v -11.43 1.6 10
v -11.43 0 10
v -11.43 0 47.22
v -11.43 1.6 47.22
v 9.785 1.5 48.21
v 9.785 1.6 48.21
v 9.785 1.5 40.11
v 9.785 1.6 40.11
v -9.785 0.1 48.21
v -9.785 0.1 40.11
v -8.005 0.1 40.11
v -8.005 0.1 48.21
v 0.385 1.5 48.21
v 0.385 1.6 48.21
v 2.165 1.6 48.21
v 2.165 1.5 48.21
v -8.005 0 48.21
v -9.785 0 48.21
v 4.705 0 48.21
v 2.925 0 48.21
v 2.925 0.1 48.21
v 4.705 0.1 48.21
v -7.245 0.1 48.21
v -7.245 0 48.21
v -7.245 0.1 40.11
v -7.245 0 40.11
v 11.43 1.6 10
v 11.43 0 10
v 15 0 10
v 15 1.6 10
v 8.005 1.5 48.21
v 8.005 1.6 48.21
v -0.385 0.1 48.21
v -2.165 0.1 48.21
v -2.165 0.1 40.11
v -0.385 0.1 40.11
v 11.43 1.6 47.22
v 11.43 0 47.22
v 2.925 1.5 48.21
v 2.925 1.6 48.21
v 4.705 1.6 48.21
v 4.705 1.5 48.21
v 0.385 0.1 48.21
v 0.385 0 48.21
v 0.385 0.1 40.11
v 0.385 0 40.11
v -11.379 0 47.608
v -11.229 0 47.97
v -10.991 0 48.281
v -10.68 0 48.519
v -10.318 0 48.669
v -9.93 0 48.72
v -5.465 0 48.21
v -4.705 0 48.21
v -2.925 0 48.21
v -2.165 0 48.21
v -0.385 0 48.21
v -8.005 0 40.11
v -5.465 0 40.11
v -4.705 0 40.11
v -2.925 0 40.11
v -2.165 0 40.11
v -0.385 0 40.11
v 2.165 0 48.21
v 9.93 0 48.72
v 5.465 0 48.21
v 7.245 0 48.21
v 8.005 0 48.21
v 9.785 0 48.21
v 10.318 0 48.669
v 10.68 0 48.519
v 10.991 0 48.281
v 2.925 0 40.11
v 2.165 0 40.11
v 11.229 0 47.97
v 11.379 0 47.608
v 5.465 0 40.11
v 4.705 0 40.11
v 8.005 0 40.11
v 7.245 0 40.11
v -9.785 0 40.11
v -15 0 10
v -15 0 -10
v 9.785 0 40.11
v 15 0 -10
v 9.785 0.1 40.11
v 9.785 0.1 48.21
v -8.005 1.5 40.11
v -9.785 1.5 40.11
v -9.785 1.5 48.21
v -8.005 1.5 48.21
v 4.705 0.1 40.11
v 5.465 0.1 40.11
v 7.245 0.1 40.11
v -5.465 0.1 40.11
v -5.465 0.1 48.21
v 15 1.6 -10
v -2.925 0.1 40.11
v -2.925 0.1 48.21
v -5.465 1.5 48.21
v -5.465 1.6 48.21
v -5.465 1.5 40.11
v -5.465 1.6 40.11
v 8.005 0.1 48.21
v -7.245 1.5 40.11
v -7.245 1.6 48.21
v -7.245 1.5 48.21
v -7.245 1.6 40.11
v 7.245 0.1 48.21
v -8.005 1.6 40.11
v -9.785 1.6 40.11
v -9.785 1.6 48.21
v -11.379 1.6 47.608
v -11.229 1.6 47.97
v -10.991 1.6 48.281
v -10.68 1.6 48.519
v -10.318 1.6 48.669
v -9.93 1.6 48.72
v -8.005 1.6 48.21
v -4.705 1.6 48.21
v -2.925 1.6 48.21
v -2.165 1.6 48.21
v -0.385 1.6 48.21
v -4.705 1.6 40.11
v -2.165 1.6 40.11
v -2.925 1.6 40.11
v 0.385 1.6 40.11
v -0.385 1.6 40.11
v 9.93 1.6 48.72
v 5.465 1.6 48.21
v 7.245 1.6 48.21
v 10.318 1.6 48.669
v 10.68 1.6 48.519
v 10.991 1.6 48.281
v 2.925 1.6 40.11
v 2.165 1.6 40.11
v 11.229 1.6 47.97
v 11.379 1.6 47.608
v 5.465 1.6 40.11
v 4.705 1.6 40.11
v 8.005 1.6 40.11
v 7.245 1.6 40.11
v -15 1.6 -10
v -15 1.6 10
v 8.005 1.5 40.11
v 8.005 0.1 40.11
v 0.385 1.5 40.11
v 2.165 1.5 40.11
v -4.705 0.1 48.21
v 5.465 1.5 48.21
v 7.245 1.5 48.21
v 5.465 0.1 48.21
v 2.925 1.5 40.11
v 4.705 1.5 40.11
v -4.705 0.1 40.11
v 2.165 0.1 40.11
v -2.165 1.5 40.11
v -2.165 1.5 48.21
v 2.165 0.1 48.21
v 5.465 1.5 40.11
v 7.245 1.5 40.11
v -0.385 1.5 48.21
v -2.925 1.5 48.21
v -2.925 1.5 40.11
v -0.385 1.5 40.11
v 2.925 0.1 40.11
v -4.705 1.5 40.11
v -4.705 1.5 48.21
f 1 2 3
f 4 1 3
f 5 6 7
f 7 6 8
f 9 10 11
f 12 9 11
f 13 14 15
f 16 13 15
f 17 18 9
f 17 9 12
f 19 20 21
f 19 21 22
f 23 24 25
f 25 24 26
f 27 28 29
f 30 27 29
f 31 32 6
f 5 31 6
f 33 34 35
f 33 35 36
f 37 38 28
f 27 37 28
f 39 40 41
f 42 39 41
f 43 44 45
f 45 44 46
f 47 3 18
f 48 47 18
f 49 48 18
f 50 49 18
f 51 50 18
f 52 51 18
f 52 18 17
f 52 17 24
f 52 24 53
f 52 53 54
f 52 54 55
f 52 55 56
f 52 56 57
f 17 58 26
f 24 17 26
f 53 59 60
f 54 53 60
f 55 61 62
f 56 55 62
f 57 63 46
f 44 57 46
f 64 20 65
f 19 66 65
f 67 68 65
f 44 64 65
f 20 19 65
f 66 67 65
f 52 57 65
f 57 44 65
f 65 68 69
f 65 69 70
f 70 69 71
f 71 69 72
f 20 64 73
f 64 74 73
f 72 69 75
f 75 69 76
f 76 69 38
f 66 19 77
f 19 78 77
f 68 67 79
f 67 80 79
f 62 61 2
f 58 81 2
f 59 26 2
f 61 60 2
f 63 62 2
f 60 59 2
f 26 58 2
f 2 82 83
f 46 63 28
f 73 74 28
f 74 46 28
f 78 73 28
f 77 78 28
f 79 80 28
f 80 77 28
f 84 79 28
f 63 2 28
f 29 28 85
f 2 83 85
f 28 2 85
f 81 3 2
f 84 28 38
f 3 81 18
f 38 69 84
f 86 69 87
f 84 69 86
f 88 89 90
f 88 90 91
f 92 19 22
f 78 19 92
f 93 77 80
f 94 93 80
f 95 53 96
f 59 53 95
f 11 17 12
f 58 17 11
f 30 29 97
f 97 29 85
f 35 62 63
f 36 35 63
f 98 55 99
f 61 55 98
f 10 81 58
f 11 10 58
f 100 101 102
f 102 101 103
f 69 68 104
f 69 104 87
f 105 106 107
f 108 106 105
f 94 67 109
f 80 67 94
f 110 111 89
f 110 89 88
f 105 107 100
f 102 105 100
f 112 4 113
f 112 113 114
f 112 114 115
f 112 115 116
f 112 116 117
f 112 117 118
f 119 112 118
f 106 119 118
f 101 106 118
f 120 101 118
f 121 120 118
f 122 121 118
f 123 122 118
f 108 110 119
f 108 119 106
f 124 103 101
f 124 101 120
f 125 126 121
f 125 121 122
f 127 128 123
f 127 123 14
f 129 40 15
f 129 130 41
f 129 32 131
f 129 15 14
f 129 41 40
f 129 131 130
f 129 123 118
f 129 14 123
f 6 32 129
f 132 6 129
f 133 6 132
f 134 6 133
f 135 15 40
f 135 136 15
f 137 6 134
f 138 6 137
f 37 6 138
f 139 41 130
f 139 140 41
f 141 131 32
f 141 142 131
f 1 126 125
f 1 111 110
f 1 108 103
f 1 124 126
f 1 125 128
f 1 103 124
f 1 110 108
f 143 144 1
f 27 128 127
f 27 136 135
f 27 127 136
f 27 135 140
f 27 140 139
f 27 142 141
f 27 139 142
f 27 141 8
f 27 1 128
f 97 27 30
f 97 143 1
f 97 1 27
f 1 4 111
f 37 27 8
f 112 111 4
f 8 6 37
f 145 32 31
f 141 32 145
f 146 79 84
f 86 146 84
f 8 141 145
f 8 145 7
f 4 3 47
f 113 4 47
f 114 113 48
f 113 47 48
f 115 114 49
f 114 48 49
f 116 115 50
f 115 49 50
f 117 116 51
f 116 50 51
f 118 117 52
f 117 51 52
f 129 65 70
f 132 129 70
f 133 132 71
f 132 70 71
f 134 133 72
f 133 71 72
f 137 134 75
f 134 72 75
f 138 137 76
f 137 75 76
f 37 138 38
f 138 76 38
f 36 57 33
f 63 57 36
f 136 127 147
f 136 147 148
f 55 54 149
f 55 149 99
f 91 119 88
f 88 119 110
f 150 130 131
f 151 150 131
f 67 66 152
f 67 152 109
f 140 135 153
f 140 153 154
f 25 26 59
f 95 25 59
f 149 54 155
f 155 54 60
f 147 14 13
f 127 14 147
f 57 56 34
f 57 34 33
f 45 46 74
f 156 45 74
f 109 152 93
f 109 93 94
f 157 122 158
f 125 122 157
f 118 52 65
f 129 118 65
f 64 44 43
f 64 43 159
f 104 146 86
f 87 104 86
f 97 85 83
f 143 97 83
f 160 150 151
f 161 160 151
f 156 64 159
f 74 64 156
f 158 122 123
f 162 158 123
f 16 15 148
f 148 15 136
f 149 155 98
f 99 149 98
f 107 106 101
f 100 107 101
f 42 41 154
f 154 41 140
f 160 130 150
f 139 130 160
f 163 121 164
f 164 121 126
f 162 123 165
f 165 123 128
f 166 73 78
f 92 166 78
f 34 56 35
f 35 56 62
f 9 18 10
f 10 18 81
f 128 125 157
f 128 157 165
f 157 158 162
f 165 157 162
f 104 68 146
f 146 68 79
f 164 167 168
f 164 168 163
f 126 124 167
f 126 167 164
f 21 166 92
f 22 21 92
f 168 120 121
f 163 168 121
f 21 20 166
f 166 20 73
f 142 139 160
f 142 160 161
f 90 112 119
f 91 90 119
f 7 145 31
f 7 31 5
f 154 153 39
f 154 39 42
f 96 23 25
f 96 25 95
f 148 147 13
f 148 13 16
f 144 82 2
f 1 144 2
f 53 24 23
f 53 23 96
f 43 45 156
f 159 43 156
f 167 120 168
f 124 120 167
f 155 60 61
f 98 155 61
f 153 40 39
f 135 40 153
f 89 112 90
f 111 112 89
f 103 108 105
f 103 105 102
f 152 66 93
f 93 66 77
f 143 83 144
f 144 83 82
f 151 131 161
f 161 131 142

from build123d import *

# Parameters (mm, degrees)
EXTRUDE_1_DEPTH     = 1.6
CUT_EXTRUDE_START   = 1.6
SKETCH_3_W          = 1.78
SKETCH_3_H          = 8.1
CUT_EXTRUDE_1_DEPTH = 0.1
SKETCH_4_W          = 1.78
SKETCH_4_H          = 8.1
CUT_EXTRUDE_2_DEPTH = 0.1


with BuildPart() as part:
    # 草图1 → 凸台-拉伸1 (new body)
    with BuildSketch(Plane(origin=(0, 0, 0), x_dir=(1, 0, 0), z_dir=(0, 1, 0))):
        with BuildLine():
            Line((11.43, -10), (15, -10))
            Line((15, -10), (15, 10))
            Line((15, 10), (-15, 10))
            Line((-15, 10), (-15, -10))
            Line((-15, -10), (-11.43, -10))
            Line((-11.43, -10), (-11.43, -47.22))
            ThreePointArc((-11.43, -47.22), (-10.990660172, -48.280660172), (-9.93, -48.72))
            Line((-9.93, -48.72), (9.93, -48.72))
            ThreePointArc((9.93, -48.72), (10.990660172, -48.280660172), (11.43, -47.22))
            Line((11.43, -47.22), (11.43, -10))
        make_face()
    extrude(amount=EXTRUDE_1_DEPTH)

    # 草图3 → 切除-拉伸1 (cut)
    with BuildSketch(Plane(origin=(0, 0, 0), x_dir=(1, 0, 0), z_dir=(0, 1, 0)).offset(CUT_EXTRUDE_START)):
        with Locations((-1.275, -44.16)):
            Rectangle(SKETCH_3_W, SKETCH_3_H)
        with Locations((1.275, -44.16)):
            Rectangle(SKETCH_3_W, SKETCH_3_H)
        with Locations((-3.815, -44.16)):
            Rectangle(SKETCH_3_W, SKETCH_3_H)
        with Locations((-6.355, -44.16)):
            Rectangle(SKETCH_3_W, SKETCH_3_H)
        with Locations((-8.895, -44.16)):
            Rectangle(SKETCH_3_W, SKETCH_3_H)
        with Locations((3.815, -44.16)):
            Rectangle(SKETCH_3_W, SKETCH_3_H)
        with Locations((6.355, -44.16)):
            Rectangle(SKETCH_3_W, SKETCH_3_H)
        with Locations((8.895, -44.16)):
            Rectangle(SKETCH_3_W, SKETCH_3_H)
    extrude(amount=-CUT_EXTRUDE_1_DEPTH, mode=Mode.SUBTRACT)

    # 草图4 → 切除-拉伸2 (cut)
    with BuildSketch(Plane(origin=(0, 0, 0), x_dir=(1, 0, 0), z_dir=(0, 1, 0))):
        with Locations((1.275, -44.16)):
            Rectangle(SKETCH_4_W, SKETCH_4_H)
        with Locations((-1.275, -44.16)):
            Rectangle(SKETCH_4_W, SKETCH_4_H)
        with Locations((-8.895, -44.16)):
            Rectangle(SKETCH_4_W, SKETCH_4_H)
        with Locations((-6.355, -44.16)):
            Rectangle(SKETCH_4_W, SKETCH_4_H)
        with Locations((-3.815, -44.16)):
            Rectangle(SKETCH_4_W, SKETCH_4_H)
        with Locations((8.895, -44.16)):
            Rectangle(SKETCH_4_W, SKETCH_4_H)
        with Locations((6.355, -44.16)):
            Rectangle(SKETCH_4_W, SKETCH_4_H)
        with Locations((3.815, -44.16)):
            Rectangle(SKETCH_4_W, SKETCH_4_H)
    extrude(amount=CUT_EXTRUDE_2_DEPTH, mode=Mode.SUBTRACT)


solid = part.part
